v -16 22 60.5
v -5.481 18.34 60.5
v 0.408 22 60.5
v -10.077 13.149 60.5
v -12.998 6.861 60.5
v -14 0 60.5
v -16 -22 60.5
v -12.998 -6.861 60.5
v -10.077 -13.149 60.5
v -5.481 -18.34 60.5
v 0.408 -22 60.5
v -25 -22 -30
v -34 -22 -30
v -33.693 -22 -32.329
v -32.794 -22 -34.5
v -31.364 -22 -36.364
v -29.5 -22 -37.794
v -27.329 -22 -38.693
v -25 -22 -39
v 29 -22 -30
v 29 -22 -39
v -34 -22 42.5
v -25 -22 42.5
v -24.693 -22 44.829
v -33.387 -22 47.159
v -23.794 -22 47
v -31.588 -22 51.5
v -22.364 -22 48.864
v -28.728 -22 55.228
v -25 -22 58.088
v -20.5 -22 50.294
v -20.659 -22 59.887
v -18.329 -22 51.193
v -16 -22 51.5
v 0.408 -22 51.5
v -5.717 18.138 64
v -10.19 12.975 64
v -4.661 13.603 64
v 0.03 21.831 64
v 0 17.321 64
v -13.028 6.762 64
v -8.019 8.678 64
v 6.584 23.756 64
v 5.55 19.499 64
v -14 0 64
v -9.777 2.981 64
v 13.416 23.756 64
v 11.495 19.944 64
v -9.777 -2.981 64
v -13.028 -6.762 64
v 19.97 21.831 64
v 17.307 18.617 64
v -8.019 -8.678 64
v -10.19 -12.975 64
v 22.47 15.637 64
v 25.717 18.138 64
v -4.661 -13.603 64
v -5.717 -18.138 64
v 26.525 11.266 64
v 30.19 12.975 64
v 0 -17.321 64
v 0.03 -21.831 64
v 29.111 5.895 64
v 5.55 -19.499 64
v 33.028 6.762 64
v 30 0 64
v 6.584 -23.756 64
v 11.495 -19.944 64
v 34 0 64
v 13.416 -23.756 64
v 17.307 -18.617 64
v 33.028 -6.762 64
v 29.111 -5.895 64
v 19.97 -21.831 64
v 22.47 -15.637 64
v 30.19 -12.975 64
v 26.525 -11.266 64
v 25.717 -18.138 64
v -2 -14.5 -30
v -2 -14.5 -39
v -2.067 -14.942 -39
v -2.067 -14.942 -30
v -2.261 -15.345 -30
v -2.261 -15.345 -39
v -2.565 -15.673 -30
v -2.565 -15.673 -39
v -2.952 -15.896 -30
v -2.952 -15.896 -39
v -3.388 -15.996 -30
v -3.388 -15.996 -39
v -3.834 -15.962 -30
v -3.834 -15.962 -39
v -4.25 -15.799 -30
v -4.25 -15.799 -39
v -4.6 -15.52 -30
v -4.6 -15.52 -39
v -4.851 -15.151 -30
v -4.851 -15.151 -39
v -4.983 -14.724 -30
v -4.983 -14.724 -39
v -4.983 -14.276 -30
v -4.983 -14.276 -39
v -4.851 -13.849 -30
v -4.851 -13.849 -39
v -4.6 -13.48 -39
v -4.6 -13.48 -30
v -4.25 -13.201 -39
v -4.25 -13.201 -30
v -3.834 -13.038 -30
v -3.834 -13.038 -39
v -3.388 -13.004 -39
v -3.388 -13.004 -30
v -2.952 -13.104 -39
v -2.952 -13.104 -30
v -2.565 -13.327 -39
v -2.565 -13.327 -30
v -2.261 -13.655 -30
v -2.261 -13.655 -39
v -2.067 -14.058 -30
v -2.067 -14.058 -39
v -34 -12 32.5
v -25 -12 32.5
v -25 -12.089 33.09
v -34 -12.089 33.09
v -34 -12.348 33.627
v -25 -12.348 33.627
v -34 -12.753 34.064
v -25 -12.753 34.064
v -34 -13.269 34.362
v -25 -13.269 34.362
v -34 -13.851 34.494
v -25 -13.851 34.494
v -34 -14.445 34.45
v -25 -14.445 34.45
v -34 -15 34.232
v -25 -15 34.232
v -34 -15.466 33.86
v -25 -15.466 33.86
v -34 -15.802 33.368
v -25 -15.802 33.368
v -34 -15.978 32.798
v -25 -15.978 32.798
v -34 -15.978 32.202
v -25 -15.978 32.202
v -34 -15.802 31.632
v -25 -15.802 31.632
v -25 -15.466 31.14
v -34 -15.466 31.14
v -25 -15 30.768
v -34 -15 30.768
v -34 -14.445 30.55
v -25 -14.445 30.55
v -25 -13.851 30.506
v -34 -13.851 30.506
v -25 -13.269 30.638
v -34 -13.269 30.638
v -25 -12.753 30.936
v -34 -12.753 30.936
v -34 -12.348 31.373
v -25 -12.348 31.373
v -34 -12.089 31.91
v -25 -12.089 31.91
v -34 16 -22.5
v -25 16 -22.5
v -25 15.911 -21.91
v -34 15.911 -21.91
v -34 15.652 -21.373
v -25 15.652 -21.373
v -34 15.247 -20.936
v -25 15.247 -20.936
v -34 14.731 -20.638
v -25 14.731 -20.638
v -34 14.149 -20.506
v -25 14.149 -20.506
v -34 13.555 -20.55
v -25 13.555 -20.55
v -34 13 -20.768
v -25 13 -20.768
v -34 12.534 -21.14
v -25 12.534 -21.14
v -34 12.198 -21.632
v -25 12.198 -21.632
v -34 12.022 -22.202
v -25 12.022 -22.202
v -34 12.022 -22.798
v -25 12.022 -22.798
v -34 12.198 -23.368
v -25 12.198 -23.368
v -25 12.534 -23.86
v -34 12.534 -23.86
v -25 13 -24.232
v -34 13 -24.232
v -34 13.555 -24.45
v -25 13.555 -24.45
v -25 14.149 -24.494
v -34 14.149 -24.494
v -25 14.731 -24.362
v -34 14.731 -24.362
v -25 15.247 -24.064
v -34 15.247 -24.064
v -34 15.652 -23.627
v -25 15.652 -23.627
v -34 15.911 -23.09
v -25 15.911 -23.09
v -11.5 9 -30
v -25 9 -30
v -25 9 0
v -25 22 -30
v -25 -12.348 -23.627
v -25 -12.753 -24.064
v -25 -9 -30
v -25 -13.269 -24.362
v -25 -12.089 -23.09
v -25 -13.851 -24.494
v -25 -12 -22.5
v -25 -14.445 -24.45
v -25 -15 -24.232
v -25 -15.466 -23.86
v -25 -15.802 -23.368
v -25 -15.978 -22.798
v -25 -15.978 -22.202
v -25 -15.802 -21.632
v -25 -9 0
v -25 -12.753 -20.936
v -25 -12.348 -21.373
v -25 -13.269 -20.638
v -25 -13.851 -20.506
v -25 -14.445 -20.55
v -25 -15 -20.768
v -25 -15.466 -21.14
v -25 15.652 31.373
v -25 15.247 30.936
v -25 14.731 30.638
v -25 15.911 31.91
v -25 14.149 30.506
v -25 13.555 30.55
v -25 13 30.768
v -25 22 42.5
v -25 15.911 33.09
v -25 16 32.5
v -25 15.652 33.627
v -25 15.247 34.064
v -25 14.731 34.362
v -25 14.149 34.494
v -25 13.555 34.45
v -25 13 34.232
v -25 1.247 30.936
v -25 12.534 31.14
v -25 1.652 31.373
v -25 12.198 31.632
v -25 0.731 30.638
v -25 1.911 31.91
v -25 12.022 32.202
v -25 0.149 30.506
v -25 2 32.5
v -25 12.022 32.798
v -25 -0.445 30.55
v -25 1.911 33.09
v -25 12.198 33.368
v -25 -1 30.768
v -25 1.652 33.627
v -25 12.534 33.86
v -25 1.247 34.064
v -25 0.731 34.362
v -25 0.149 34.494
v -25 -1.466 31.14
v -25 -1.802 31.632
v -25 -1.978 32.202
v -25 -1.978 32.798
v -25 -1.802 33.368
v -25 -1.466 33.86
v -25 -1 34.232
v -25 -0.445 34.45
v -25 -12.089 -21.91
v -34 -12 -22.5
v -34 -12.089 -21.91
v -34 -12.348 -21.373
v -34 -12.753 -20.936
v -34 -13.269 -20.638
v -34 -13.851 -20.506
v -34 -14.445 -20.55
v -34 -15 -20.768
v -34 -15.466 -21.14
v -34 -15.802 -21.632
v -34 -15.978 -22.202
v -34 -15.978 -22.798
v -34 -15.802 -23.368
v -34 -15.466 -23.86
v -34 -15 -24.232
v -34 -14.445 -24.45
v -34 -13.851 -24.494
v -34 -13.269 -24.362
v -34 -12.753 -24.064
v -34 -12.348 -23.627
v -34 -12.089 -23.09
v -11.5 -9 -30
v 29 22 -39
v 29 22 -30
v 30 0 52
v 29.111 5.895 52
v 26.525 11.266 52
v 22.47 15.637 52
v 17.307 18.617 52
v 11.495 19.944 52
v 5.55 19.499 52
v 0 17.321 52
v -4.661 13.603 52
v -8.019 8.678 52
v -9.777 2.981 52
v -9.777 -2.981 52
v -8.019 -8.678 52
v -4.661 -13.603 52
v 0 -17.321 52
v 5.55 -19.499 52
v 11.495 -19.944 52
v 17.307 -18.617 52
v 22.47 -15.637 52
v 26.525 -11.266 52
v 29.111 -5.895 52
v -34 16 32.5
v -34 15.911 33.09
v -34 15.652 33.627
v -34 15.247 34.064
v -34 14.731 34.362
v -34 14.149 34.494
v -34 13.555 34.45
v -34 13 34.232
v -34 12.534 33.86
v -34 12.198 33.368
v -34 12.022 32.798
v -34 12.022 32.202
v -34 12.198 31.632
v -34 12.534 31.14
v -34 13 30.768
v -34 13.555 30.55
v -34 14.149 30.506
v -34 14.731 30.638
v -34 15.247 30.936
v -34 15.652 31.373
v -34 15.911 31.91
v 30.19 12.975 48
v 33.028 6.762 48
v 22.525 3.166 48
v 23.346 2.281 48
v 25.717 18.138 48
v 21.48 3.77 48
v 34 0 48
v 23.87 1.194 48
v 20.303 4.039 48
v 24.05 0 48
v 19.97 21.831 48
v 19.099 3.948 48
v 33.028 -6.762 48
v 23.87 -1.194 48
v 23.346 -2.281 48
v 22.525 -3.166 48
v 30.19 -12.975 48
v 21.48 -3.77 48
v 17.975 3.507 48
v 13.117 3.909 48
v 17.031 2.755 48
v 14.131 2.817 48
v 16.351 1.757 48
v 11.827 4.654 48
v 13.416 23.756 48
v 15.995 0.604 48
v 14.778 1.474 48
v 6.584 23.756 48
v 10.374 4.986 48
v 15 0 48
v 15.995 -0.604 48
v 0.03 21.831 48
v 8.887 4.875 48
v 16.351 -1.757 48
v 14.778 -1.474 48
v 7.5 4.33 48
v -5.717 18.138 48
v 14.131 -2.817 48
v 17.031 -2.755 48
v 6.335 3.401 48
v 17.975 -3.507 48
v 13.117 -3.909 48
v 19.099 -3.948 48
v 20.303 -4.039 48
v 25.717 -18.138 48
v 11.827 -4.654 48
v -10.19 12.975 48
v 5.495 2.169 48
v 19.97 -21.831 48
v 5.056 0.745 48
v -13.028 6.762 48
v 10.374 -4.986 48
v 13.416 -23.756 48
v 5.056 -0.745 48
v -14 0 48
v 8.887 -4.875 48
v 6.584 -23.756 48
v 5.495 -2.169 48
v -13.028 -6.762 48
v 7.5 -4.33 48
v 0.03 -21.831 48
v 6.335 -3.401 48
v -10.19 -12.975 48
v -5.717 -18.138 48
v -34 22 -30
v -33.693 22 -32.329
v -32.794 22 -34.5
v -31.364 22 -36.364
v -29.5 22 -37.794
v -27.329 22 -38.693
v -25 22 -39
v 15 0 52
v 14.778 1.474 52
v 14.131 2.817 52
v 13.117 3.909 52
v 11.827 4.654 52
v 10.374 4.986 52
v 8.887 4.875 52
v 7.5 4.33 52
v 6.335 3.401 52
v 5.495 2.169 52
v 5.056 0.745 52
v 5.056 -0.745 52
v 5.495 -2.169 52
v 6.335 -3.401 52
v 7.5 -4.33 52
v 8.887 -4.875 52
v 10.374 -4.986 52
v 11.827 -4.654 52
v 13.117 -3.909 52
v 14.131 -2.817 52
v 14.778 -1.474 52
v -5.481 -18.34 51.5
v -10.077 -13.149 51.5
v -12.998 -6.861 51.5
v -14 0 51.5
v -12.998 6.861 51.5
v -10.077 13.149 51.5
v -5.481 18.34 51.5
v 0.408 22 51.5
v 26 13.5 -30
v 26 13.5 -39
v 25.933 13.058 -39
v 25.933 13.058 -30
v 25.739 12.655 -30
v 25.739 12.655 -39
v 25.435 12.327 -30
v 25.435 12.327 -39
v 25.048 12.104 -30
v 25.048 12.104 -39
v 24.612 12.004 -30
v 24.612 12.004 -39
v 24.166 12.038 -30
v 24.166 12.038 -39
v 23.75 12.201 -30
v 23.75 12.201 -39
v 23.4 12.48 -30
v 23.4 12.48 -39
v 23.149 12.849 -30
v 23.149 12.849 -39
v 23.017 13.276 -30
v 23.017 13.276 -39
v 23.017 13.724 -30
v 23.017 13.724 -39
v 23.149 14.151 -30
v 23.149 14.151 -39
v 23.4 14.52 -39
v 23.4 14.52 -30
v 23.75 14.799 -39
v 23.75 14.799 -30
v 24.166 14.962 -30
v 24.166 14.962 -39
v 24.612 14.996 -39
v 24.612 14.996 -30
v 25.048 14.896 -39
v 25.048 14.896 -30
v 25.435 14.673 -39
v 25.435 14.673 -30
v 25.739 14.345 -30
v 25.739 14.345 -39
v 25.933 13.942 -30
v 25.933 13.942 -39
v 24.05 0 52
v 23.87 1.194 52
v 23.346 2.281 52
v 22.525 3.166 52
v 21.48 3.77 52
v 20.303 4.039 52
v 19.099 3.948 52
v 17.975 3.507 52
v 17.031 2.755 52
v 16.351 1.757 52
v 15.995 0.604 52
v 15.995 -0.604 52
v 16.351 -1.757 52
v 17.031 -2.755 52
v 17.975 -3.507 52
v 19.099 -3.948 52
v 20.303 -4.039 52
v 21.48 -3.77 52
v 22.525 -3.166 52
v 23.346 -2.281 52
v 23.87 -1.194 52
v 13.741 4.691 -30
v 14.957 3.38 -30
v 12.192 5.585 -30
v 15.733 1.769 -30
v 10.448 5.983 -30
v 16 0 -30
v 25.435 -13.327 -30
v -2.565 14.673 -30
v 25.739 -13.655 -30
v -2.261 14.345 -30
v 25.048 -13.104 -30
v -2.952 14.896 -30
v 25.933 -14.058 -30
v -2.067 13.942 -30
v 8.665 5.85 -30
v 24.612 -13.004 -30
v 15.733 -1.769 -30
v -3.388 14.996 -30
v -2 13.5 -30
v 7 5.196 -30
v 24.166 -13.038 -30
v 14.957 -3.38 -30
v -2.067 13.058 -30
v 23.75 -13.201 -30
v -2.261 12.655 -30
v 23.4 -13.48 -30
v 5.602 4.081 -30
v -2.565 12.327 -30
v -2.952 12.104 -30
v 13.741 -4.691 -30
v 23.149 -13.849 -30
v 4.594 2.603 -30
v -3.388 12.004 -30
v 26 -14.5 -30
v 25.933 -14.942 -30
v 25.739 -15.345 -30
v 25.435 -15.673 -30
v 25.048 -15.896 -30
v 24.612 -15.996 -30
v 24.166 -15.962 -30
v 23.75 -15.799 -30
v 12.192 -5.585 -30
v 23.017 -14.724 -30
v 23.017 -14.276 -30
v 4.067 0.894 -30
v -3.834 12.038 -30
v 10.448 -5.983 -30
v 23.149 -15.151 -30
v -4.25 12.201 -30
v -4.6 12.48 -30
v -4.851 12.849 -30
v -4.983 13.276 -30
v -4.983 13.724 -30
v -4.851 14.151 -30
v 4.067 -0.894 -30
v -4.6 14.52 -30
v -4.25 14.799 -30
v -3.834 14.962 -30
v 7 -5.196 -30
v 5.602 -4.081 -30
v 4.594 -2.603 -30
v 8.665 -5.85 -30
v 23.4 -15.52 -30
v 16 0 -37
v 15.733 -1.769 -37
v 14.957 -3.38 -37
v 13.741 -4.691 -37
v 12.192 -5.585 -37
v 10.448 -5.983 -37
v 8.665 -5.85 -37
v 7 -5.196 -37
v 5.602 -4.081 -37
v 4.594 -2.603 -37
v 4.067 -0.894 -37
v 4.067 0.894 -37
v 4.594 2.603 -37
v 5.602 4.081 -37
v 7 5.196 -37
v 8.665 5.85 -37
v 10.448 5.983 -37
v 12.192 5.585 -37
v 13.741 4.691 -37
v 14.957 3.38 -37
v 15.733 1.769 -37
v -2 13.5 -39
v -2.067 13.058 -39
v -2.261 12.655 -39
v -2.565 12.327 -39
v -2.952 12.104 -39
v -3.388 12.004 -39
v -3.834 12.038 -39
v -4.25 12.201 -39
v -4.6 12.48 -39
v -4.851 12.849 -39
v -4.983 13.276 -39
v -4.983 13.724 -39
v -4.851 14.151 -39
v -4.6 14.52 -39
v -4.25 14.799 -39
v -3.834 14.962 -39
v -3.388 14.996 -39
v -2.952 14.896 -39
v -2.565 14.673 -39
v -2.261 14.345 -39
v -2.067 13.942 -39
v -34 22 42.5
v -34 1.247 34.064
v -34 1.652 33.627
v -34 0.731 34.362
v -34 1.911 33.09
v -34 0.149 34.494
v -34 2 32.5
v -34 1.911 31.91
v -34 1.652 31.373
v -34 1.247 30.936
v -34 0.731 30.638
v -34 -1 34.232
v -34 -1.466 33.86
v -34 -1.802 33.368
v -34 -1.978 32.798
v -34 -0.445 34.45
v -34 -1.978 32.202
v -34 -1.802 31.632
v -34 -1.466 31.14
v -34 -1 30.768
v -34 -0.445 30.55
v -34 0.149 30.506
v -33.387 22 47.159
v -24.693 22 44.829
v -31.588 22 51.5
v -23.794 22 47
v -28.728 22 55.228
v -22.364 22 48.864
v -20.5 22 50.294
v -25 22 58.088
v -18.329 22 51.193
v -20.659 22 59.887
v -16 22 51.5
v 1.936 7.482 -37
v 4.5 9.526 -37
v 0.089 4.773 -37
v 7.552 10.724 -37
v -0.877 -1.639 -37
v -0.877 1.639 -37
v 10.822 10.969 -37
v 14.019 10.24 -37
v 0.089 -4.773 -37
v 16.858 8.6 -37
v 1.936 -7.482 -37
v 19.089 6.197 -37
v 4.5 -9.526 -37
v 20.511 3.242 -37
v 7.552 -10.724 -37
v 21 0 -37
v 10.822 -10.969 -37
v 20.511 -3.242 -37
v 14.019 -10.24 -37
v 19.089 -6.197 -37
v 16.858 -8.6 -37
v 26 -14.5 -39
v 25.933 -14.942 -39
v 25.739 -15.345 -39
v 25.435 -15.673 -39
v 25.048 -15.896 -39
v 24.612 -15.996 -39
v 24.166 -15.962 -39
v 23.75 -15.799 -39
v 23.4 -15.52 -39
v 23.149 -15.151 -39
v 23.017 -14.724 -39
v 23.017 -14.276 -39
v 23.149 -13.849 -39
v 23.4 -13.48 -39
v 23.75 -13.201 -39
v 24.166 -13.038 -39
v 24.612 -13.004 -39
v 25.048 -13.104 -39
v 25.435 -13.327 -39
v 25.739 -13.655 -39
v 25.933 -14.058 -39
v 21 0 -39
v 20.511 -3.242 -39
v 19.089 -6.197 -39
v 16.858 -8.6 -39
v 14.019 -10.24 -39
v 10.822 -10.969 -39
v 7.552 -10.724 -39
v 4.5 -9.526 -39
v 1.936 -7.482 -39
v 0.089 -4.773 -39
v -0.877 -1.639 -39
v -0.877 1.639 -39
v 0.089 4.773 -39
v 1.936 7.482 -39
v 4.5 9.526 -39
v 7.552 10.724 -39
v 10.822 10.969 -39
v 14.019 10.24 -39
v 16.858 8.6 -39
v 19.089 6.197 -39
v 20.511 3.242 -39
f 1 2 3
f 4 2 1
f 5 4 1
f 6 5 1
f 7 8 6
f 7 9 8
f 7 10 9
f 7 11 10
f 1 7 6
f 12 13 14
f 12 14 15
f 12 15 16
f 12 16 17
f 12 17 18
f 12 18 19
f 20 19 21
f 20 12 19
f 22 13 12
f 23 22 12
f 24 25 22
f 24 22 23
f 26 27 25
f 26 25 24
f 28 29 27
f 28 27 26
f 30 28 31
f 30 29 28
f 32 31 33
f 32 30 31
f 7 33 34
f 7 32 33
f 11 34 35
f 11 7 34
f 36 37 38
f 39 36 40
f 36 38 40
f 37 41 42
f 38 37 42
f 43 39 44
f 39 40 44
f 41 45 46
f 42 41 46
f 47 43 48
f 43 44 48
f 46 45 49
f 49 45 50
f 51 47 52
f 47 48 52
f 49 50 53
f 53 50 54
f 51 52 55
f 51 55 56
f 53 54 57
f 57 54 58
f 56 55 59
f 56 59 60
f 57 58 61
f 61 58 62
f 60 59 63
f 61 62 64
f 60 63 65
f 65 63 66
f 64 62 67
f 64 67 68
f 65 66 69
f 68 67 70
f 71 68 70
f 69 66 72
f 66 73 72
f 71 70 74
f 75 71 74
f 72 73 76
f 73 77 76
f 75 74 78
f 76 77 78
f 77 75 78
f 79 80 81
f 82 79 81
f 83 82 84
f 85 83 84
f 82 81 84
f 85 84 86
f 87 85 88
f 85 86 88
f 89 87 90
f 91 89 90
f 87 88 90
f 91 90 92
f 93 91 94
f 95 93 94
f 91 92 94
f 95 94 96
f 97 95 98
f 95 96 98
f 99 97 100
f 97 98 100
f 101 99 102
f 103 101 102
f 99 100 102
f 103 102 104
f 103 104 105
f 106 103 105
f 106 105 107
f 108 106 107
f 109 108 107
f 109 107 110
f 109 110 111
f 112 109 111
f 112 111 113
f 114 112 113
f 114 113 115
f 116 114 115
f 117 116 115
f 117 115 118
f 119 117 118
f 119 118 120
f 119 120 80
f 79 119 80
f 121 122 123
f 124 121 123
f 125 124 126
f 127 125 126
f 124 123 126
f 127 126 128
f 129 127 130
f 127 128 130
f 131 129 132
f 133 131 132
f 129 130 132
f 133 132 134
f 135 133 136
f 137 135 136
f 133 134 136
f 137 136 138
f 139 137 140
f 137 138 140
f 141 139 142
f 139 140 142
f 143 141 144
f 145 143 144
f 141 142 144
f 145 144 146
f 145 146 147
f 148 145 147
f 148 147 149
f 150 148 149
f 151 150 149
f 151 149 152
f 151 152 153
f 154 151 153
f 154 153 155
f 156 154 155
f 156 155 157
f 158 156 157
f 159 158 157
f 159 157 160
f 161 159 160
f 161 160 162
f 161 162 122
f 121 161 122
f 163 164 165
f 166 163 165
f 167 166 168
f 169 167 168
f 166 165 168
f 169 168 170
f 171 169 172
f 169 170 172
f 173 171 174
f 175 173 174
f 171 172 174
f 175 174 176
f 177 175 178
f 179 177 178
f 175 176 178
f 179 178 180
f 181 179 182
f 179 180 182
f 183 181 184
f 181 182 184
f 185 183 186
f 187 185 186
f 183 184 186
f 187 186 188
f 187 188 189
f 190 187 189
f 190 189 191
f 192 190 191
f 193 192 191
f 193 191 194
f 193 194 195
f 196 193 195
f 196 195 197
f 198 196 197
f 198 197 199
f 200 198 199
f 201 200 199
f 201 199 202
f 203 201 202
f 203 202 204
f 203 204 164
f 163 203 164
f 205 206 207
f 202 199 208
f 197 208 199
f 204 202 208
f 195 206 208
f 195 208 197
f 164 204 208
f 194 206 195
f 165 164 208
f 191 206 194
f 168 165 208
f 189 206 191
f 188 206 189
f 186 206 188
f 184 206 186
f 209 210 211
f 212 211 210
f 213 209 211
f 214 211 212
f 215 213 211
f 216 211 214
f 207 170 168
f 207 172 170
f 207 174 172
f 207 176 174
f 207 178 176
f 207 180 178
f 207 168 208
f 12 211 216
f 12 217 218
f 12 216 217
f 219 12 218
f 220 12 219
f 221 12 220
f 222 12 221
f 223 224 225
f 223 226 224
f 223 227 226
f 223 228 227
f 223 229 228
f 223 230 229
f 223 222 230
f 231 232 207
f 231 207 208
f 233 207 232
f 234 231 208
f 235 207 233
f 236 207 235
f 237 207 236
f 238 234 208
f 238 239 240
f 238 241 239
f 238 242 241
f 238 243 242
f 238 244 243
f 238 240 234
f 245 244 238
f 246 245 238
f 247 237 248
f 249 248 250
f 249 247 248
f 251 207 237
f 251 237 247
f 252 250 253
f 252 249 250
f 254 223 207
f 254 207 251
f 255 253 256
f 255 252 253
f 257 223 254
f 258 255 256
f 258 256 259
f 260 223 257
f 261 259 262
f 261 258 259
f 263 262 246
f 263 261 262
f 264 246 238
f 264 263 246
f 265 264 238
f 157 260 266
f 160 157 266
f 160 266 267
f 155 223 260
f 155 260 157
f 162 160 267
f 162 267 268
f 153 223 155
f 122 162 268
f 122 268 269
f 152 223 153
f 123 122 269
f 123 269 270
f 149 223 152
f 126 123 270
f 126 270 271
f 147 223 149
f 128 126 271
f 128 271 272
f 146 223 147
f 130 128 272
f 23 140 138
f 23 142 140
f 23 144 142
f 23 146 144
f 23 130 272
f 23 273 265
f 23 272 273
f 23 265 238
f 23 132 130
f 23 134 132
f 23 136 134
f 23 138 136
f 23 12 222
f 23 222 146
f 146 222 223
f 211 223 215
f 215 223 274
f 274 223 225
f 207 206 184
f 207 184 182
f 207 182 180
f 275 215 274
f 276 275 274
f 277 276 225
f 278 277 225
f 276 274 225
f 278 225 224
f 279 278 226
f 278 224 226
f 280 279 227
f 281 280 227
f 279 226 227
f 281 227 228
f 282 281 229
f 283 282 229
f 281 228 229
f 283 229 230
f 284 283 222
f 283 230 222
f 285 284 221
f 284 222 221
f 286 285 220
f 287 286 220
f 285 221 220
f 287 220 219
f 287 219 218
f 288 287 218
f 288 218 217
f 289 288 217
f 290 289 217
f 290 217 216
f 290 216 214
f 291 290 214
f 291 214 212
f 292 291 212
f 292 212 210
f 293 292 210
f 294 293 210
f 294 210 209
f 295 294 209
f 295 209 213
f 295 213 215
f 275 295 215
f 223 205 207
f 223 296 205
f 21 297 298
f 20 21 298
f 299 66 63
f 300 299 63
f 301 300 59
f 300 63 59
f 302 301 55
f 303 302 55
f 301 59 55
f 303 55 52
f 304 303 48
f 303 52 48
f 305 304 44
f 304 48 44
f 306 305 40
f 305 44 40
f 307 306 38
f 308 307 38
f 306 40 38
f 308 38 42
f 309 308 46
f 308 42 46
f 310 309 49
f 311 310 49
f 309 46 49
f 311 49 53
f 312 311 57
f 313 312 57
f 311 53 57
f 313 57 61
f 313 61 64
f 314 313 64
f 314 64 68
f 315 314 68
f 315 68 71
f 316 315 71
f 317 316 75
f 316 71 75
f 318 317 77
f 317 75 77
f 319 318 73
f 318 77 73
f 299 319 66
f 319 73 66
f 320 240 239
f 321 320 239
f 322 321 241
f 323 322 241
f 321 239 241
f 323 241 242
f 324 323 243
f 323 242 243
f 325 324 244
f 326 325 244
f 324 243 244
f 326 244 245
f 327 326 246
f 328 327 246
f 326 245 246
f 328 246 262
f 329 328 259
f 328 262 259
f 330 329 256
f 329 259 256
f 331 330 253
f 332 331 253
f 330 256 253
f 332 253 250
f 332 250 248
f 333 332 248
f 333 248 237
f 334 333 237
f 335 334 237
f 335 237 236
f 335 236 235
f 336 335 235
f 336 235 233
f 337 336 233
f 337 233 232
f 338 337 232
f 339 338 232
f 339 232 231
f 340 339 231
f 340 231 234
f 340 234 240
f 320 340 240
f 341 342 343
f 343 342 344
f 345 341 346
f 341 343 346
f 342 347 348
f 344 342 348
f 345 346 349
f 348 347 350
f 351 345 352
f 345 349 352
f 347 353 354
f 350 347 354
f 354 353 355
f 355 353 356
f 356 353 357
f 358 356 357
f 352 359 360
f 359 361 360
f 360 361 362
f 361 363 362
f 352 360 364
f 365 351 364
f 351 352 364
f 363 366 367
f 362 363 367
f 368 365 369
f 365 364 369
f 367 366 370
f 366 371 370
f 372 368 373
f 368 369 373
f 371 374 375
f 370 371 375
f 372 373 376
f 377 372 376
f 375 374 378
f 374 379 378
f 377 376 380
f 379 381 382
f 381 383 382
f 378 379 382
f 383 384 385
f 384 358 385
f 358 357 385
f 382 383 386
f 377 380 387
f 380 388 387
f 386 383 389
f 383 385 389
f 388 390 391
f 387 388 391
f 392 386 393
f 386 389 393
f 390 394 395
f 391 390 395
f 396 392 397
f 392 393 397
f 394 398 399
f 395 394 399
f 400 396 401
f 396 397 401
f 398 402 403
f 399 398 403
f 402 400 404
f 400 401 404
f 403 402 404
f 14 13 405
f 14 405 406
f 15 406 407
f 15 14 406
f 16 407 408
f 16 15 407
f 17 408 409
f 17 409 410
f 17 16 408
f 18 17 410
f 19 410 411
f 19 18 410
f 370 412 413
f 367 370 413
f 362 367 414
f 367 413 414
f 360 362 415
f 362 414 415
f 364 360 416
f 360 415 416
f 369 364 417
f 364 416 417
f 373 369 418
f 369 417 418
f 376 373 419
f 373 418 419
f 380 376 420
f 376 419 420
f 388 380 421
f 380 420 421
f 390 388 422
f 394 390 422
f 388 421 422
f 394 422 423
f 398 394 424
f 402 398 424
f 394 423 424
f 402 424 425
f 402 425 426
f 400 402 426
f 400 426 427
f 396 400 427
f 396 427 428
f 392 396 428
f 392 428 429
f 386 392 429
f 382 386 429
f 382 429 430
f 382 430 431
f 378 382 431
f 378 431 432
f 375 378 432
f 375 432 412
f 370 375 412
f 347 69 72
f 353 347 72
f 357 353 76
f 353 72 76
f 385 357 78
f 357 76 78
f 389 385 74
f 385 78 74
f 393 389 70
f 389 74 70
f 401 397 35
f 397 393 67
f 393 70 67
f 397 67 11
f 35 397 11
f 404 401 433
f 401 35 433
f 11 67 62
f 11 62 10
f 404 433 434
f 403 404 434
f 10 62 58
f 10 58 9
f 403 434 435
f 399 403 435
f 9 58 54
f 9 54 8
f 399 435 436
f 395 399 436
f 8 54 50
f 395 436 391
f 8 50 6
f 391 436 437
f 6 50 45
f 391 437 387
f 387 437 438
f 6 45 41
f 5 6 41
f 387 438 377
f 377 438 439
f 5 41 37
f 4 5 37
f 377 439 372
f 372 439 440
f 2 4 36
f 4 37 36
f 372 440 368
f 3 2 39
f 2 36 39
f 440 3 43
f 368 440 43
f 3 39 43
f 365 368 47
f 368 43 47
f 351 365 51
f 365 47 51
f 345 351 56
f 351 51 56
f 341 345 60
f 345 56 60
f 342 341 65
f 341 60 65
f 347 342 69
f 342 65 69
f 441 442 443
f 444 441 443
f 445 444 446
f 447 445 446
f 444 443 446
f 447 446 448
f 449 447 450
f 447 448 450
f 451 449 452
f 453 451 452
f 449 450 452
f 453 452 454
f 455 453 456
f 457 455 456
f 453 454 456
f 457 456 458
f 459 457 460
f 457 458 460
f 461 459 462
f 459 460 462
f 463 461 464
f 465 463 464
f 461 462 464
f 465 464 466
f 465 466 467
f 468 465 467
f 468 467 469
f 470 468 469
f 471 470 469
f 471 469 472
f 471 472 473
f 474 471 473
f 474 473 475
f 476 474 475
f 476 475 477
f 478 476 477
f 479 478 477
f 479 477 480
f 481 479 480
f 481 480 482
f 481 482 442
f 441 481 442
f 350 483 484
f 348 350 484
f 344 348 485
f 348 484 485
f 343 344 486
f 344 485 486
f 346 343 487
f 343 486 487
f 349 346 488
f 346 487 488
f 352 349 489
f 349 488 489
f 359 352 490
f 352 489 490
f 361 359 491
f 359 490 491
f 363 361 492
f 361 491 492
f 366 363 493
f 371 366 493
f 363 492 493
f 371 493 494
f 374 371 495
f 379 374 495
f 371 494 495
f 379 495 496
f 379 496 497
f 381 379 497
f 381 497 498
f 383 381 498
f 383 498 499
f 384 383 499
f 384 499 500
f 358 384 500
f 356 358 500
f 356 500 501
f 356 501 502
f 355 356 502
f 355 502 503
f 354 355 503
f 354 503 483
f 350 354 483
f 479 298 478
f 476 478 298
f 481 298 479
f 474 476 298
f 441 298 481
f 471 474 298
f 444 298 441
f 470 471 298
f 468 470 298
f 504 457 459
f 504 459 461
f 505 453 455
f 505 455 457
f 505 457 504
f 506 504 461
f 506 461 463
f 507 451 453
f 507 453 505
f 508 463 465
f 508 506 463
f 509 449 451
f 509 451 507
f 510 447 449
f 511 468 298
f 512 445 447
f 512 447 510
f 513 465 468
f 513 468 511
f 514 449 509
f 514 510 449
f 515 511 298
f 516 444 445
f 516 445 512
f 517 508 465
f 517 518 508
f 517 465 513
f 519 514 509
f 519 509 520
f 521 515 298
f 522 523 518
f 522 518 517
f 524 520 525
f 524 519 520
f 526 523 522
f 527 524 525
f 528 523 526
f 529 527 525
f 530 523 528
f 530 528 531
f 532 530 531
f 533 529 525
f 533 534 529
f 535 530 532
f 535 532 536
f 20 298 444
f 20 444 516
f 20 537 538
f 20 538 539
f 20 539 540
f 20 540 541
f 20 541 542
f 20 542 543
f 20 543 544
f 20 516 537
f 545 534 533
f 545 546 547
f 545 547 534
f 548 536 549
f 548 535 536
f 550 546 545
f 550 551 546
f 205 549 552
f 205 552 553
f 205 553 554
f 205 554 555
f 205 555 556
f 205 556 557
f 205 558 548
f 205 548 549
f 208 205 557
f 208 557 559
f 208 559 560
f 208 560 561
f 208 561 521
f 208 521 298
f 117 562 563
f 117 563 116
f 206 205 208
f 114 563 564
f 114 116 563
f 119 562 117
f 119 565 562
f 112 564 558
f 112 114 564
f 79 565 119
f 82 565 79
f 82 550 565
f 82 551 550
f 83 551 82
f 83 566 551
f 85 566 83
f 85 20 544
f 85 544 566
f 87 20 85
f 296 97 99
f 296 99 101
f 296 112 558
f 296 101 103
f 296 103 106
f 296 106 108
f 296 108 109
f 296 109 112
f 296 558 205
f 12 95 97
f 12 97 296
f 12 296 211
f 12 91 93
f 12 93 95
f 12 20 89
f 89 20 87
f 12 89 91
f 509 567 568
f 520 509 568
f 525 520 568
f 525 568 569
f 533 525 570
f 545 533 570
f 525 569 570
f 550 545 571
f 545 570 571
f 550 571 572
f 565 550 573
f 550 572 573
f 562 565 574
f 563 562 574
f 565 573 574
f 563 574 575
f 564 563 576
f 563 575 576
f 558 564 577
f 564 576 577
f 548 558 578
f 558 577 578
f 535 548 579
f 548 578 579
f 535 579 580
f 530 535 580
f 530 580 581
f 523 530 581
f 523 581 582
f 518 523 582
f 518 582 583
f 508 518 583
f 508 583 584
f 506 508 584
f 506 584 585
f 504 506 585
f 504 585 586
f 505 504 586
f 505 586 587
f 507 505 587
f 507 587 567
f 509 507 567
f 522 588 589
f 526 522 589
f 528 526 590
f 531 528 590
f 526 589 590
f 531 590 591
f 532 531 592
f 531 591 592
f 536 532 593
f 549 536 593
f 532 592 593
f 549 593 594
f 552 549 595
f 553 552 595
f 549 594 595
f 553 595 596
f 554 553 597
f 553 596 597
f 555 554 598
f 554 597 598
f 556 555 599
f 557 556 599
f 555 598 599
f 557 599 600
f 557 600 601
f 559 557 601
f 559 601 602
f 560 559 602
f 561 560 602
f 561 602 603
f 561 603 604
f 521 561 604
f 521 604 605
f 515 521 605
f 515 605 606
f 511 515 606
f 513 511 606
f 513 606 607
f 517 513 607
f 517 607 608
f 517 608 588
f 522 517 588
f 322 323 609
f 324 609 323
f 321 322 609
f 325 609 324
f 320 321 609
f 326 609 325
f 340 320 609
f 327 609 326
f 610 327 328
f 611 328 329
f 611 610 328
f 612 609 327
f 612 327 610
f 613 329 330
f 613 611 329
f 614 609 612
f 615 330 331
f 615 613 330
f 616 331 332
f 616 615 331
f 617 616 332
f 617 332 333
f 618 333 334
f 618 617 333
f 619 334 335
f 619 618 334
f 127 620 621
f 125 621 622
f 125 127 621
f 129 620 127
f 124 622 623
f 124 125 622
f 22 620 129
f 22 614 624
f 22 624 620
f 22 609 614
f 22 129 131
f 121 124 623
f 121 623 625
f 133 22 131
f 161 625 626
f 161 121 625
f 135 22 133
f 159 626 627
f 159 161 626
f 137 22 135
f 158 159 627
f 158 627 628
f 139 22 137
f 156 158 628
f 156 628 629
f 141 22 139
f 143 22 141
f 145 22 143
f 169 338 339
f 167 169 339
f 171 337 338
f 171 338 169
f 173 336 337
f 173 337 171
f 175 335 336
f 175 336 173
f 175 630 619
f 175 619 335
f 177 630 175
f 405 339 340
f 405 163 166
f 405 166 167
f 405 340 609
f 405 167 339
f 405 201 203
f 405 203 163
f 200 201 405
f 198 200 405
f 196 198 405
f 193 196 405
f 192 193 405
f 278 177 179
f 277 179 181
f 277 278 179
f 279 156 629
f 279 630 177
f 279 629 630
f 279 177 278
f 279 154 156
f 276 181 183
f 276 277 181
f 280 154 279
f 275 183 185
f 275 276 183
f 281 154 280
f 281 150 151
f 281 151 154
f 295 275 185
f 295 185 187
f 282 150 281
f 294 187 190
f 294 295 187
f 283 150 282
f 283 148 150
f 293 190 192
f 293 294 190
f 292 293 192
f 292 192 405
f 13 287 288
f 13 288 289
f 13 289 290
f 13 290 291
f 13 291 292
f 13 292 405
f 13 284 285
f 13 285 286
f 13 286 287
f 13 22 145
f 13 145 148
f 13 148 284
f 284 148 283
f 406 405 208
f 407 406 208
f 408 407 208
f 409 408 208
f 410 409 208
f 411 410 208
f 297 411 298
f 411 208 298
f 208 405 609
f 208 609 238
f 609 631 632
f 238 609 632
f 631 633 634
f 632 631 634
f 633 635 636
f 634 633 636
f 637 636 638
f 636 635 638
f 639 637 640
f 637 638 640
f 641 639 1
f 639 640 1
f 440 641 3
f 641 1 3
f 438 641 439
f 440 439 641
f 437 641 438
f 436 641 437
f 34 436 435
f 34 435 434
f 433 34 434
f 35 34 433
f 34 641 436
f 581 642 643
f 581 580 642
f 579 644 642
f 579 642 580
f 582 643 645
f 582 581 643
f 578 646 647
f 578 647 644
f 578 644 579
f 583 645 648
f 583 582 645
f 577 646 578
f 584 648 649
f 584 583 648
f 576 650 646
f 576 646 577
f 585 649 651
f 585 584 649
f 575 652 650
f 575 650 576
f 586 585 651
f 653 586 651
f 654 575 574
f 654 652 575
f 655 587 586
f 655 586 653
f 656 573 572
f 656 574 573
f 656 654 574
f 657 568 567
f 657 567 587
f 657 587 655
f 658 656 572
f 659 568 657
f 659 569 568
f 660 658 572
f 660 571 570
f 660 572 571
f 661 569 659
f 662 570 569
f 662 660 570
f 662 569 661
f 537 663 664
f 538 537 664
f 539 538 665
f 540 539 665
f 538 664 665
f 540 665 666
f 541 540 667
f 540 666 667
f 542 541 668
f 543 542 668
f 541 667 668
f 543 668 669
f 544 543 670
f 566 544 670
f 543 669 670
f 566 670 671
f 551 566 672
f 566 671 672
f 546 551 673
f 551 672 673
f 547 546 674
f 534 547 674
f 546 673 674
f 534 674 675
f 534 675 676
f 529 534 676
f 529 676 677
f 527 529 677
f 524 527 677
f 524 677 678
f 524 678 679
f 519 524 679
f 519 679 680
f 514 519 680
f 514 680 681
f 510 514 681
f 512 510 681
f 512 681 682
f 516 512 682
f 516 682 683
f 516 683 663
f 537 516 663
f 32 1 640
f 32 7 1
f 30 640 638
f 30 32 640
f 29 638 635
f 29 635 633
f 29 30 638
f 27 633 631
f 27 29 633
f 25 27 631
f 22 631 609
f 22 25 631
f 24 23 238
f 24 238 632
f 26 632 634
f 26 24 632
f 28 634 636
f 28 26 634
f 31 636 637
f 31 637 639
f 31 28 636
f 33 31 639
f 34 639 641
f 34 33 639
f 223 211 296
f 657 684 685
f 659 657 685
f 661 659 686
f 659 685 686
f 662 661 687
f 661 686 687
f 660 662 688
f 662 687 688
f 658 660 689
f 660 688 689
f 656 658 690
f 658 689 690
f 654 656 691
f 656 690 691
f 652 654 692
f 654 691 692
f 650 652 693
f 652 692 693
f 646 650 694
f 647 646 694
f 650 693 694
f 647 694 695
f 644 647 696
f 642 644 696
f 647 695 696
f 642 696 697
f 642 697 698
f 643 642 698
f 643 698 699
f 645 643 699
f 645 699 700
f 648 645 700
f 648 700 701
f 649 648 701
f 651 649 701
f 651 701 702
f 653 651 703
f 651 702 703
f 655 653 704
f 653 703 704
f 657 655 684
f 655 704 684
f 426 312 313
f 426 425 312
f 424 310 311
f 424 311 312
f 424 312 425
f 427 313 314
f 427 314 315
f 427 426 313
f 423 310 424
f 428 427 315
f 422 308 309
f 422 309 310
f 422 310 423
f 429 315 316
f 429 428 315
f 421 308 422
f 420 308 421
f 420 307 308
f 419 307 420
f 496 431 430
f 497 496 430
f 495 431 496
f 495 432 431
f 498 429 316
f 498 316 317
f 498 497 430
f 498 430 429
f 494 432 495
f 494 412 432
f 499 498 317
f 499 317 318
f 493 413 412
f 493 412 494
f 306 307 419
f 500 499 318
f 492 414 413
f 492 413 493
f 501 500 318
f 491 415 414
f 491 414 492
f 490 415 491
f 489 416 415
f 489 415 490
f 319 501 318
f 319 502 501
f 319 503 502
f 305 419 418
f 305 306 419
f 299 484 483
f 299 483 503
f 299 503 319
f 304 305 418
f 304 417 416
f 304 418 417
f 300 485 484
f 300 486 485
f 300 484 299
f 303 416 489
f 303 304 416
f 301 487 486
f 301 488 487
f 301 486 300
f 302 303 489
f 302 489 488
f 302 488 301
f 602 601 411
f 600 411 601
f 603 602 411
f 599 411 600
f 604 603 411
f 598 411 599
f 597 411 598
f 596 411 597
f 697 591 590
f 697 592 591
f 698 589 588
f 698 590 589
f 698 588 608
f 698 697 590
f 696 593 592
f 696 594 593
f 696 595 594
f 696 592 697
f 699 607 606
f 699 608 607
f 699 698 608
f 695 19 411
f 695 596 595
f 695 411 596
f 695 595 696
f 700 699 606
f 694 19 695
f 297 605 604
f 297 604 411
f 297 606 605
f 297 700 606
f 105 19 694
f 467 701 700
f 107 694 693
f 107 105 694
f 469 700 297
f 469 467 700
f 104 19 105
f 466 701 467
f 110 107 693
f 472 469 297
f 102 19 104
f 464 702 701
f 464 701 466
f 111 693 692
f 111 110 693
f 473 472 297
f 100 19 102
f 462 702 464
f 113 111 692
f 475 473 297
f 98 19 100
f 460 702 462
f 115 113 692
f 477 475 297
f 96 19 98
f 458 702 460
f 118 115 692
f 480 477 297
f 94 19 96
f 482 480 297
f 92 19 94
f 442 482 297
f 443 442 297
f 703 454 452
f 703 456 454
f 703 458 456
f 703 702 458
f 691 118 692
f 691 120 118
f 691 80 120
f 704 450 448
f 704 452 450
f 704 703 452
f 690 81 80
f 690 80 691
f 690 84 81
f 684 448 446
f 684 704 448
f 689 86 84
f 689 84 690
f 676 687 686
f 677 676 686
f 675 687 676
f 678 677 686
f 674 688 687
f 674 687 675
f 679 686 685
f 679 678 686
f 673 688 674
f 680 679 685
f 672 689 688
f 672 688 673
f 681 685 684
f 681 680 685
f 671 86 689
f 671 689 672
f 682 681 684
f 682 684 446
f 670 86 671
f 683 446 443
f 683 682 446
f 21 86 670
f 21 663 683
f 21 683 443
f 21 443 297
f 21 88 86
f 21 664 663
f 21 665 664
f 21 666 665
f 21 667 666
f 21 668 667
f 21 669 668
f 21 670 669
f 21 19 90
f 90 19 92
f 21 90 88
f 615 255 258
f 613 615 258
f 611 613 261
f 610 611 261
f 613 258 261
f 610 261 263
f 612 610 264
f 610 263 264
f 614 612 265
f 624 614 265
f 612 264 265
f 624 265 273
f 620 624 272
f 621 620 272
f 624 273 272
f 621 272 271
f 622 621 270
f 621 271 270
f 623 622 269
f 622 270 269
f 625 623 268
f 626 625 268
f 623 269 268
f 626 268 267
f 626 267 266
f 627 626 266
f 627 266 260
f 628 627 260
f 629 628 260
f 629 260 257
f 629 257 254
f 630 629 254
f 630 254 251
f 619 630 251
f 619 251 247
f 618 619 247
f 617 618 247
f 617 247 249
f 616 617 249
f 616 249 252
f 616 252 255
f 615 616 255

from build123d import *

# Parameters (mm, degrees)
F0_W      = 2
F0_H      = 9
F0_W_2    = 24
F1_DEPTH  = 22
F3_R      = 20
F4_DEPTH  = 12
F5_R      = 5
F5_R_2    = 4.05
F6_DEPTH  = 50
F7_R      = 2
F8_DEPTH  = 9.001
F9_R      = 11
F10_DEPTH = 2
F11_R     = 1.5
F12_DEPTH = 20
F13_R     = 6
F14_DEPTH = 25
F15_DEPTH = 9


with BuildPart() as f1:
    # F0 (on Front) → F1 (new body, symmetric)
    with BuildSketch(Plane.XZ):
        with BuildLine():
            Line((-16, 51.5), (-16, 60.5))
            ThreePointArc((-16, 60.5), (-28.7279220614, 55.2279220614), (-34, 42.5))
            Line((-34, 42.5), (-34, -30))
            ThreePointArc((-34, -30), (-31.3639610307, -36.3639610307), (-25, -39))
            Line((-25, -39), (-25, -30))
            Line((-25, -30), (-25, 0))
            Line((-25, 0), (-25, 42.5))
            ThreePointArc((-25, 42.5), (-22.3639610307, 48.8639610307), (-16, 51.5))
        make_face()
        with Locations((-15, 56)):
            Rectangle(F0_W, F0_H)
        with Locations((-2, 56)):
            Rectangle(F0_W_2, F0_H)
        Polygon((-25, -30), (-25, -39), (29, -39), (29, -30), (-11.5, -30), align=None)
    extrude(amount=F1_DEPTH, both=True)

    # F0 (on Front) → F2 (revolve)
    with BuildSketch(Plane.XZ):
        Polygon((34, 64), (10, 64), (10, 60.5), (10, 51.5), (10, 48), (34, 48), align=None)
    revolve(axis=Axis((10, 0, 55.4929765165), (0, 0, -1)))

    # F3 (on face) → F4 (cut)
    with BuildSketch(Plane.XY.offset(64)):
        with Locations((10, 0)):
            Circle(F3_R)
    extrude(amount=-F4_DEPTH, mode=Mode.SUBTRACT)

    # F5 (on face) → F6 (cut)
    with BuildSketch(Plane.XY.offset(52)):
        with Locations((10, 0)):
            Circle(F5_R)
        with Locations((20, 0)):
            Circle(F5_R_2)
    extrude(amount=-F6_DEPTH, mode=Mode.SUBTRACT)

    # F7 (on face) → F8 (cut, through all)
    with BuildSketch(Plane.YZ.offset(-25)):
        with Locations((14, -22.5)):
            Circle(F7_R)
        with Locations((14, 32.5)):
            Circle(F7_R)
        with Locations((0, 32.5)):
            Circle(F7_R)
        with Locations((-14, -22.5)):
            Circle(F7_R)
        with Locations((-14, 32.5)):
            Circle(F7_R)
    extrude(amount=-F8_DEPTH, mode=Mode.SUBTRACT)

    # F9 (on face) → F10 (cut)
    with BuildSketch(Plane(origin=(0, 0, -39), x_dir=(1, 0, 0), z_dir=(0, 0, -1))):
        with Locations((10, 0)):
            Circle(F9_R)
    extrude(amount=-F10_DEPTH, mode=Mode.SUBTRACT)

    # F11 (on face) → F12 (cut)
    with BuildSketch(Plane(origin=(0, 0, -39), x_dir=(1, 0, 0), z_dir=(0, 0, -1))):
        with Locations((-3.5, -13.5)):
            Circle(F11_R)
        with Locations((-3.5, 14.5)):
            Circle(F11_R)
        with Locations((24.5, -13.5)):
            Circle(F11_R)
        with Locations((24.5, 14.5)):
            Circle(F11_R)
        with Locations((52.5, -13.5)):
            Circle(F11_R)
        with Locations((52.5, 14.5)):
            Circle(F11_R)
    extrude(amount=-F12_DEPTH, mode=Mode.SUBTRACT)

    # F13 (on face) → F14 (cut)
    with BuildSketch(Plane(origin=(0, 0, -39), x_dir=(1, 0, 0), z_dir=(0, 0, -1))):
        with Locations((10, 0)):
            Circle(F13_R)
    extrude(amount=-F14_DEPTH, mode=Mode.SUBTRACT)

    # F0 (on Front) → F15 (join, symmetric)
    with BuildSketch(Plane.XZ):
        Polygon((-11.5, -30), (-25, 0), (-25, -30), align=None)
    extrude(amount=F15_DEPTH, both=True)


solid = f1.part
